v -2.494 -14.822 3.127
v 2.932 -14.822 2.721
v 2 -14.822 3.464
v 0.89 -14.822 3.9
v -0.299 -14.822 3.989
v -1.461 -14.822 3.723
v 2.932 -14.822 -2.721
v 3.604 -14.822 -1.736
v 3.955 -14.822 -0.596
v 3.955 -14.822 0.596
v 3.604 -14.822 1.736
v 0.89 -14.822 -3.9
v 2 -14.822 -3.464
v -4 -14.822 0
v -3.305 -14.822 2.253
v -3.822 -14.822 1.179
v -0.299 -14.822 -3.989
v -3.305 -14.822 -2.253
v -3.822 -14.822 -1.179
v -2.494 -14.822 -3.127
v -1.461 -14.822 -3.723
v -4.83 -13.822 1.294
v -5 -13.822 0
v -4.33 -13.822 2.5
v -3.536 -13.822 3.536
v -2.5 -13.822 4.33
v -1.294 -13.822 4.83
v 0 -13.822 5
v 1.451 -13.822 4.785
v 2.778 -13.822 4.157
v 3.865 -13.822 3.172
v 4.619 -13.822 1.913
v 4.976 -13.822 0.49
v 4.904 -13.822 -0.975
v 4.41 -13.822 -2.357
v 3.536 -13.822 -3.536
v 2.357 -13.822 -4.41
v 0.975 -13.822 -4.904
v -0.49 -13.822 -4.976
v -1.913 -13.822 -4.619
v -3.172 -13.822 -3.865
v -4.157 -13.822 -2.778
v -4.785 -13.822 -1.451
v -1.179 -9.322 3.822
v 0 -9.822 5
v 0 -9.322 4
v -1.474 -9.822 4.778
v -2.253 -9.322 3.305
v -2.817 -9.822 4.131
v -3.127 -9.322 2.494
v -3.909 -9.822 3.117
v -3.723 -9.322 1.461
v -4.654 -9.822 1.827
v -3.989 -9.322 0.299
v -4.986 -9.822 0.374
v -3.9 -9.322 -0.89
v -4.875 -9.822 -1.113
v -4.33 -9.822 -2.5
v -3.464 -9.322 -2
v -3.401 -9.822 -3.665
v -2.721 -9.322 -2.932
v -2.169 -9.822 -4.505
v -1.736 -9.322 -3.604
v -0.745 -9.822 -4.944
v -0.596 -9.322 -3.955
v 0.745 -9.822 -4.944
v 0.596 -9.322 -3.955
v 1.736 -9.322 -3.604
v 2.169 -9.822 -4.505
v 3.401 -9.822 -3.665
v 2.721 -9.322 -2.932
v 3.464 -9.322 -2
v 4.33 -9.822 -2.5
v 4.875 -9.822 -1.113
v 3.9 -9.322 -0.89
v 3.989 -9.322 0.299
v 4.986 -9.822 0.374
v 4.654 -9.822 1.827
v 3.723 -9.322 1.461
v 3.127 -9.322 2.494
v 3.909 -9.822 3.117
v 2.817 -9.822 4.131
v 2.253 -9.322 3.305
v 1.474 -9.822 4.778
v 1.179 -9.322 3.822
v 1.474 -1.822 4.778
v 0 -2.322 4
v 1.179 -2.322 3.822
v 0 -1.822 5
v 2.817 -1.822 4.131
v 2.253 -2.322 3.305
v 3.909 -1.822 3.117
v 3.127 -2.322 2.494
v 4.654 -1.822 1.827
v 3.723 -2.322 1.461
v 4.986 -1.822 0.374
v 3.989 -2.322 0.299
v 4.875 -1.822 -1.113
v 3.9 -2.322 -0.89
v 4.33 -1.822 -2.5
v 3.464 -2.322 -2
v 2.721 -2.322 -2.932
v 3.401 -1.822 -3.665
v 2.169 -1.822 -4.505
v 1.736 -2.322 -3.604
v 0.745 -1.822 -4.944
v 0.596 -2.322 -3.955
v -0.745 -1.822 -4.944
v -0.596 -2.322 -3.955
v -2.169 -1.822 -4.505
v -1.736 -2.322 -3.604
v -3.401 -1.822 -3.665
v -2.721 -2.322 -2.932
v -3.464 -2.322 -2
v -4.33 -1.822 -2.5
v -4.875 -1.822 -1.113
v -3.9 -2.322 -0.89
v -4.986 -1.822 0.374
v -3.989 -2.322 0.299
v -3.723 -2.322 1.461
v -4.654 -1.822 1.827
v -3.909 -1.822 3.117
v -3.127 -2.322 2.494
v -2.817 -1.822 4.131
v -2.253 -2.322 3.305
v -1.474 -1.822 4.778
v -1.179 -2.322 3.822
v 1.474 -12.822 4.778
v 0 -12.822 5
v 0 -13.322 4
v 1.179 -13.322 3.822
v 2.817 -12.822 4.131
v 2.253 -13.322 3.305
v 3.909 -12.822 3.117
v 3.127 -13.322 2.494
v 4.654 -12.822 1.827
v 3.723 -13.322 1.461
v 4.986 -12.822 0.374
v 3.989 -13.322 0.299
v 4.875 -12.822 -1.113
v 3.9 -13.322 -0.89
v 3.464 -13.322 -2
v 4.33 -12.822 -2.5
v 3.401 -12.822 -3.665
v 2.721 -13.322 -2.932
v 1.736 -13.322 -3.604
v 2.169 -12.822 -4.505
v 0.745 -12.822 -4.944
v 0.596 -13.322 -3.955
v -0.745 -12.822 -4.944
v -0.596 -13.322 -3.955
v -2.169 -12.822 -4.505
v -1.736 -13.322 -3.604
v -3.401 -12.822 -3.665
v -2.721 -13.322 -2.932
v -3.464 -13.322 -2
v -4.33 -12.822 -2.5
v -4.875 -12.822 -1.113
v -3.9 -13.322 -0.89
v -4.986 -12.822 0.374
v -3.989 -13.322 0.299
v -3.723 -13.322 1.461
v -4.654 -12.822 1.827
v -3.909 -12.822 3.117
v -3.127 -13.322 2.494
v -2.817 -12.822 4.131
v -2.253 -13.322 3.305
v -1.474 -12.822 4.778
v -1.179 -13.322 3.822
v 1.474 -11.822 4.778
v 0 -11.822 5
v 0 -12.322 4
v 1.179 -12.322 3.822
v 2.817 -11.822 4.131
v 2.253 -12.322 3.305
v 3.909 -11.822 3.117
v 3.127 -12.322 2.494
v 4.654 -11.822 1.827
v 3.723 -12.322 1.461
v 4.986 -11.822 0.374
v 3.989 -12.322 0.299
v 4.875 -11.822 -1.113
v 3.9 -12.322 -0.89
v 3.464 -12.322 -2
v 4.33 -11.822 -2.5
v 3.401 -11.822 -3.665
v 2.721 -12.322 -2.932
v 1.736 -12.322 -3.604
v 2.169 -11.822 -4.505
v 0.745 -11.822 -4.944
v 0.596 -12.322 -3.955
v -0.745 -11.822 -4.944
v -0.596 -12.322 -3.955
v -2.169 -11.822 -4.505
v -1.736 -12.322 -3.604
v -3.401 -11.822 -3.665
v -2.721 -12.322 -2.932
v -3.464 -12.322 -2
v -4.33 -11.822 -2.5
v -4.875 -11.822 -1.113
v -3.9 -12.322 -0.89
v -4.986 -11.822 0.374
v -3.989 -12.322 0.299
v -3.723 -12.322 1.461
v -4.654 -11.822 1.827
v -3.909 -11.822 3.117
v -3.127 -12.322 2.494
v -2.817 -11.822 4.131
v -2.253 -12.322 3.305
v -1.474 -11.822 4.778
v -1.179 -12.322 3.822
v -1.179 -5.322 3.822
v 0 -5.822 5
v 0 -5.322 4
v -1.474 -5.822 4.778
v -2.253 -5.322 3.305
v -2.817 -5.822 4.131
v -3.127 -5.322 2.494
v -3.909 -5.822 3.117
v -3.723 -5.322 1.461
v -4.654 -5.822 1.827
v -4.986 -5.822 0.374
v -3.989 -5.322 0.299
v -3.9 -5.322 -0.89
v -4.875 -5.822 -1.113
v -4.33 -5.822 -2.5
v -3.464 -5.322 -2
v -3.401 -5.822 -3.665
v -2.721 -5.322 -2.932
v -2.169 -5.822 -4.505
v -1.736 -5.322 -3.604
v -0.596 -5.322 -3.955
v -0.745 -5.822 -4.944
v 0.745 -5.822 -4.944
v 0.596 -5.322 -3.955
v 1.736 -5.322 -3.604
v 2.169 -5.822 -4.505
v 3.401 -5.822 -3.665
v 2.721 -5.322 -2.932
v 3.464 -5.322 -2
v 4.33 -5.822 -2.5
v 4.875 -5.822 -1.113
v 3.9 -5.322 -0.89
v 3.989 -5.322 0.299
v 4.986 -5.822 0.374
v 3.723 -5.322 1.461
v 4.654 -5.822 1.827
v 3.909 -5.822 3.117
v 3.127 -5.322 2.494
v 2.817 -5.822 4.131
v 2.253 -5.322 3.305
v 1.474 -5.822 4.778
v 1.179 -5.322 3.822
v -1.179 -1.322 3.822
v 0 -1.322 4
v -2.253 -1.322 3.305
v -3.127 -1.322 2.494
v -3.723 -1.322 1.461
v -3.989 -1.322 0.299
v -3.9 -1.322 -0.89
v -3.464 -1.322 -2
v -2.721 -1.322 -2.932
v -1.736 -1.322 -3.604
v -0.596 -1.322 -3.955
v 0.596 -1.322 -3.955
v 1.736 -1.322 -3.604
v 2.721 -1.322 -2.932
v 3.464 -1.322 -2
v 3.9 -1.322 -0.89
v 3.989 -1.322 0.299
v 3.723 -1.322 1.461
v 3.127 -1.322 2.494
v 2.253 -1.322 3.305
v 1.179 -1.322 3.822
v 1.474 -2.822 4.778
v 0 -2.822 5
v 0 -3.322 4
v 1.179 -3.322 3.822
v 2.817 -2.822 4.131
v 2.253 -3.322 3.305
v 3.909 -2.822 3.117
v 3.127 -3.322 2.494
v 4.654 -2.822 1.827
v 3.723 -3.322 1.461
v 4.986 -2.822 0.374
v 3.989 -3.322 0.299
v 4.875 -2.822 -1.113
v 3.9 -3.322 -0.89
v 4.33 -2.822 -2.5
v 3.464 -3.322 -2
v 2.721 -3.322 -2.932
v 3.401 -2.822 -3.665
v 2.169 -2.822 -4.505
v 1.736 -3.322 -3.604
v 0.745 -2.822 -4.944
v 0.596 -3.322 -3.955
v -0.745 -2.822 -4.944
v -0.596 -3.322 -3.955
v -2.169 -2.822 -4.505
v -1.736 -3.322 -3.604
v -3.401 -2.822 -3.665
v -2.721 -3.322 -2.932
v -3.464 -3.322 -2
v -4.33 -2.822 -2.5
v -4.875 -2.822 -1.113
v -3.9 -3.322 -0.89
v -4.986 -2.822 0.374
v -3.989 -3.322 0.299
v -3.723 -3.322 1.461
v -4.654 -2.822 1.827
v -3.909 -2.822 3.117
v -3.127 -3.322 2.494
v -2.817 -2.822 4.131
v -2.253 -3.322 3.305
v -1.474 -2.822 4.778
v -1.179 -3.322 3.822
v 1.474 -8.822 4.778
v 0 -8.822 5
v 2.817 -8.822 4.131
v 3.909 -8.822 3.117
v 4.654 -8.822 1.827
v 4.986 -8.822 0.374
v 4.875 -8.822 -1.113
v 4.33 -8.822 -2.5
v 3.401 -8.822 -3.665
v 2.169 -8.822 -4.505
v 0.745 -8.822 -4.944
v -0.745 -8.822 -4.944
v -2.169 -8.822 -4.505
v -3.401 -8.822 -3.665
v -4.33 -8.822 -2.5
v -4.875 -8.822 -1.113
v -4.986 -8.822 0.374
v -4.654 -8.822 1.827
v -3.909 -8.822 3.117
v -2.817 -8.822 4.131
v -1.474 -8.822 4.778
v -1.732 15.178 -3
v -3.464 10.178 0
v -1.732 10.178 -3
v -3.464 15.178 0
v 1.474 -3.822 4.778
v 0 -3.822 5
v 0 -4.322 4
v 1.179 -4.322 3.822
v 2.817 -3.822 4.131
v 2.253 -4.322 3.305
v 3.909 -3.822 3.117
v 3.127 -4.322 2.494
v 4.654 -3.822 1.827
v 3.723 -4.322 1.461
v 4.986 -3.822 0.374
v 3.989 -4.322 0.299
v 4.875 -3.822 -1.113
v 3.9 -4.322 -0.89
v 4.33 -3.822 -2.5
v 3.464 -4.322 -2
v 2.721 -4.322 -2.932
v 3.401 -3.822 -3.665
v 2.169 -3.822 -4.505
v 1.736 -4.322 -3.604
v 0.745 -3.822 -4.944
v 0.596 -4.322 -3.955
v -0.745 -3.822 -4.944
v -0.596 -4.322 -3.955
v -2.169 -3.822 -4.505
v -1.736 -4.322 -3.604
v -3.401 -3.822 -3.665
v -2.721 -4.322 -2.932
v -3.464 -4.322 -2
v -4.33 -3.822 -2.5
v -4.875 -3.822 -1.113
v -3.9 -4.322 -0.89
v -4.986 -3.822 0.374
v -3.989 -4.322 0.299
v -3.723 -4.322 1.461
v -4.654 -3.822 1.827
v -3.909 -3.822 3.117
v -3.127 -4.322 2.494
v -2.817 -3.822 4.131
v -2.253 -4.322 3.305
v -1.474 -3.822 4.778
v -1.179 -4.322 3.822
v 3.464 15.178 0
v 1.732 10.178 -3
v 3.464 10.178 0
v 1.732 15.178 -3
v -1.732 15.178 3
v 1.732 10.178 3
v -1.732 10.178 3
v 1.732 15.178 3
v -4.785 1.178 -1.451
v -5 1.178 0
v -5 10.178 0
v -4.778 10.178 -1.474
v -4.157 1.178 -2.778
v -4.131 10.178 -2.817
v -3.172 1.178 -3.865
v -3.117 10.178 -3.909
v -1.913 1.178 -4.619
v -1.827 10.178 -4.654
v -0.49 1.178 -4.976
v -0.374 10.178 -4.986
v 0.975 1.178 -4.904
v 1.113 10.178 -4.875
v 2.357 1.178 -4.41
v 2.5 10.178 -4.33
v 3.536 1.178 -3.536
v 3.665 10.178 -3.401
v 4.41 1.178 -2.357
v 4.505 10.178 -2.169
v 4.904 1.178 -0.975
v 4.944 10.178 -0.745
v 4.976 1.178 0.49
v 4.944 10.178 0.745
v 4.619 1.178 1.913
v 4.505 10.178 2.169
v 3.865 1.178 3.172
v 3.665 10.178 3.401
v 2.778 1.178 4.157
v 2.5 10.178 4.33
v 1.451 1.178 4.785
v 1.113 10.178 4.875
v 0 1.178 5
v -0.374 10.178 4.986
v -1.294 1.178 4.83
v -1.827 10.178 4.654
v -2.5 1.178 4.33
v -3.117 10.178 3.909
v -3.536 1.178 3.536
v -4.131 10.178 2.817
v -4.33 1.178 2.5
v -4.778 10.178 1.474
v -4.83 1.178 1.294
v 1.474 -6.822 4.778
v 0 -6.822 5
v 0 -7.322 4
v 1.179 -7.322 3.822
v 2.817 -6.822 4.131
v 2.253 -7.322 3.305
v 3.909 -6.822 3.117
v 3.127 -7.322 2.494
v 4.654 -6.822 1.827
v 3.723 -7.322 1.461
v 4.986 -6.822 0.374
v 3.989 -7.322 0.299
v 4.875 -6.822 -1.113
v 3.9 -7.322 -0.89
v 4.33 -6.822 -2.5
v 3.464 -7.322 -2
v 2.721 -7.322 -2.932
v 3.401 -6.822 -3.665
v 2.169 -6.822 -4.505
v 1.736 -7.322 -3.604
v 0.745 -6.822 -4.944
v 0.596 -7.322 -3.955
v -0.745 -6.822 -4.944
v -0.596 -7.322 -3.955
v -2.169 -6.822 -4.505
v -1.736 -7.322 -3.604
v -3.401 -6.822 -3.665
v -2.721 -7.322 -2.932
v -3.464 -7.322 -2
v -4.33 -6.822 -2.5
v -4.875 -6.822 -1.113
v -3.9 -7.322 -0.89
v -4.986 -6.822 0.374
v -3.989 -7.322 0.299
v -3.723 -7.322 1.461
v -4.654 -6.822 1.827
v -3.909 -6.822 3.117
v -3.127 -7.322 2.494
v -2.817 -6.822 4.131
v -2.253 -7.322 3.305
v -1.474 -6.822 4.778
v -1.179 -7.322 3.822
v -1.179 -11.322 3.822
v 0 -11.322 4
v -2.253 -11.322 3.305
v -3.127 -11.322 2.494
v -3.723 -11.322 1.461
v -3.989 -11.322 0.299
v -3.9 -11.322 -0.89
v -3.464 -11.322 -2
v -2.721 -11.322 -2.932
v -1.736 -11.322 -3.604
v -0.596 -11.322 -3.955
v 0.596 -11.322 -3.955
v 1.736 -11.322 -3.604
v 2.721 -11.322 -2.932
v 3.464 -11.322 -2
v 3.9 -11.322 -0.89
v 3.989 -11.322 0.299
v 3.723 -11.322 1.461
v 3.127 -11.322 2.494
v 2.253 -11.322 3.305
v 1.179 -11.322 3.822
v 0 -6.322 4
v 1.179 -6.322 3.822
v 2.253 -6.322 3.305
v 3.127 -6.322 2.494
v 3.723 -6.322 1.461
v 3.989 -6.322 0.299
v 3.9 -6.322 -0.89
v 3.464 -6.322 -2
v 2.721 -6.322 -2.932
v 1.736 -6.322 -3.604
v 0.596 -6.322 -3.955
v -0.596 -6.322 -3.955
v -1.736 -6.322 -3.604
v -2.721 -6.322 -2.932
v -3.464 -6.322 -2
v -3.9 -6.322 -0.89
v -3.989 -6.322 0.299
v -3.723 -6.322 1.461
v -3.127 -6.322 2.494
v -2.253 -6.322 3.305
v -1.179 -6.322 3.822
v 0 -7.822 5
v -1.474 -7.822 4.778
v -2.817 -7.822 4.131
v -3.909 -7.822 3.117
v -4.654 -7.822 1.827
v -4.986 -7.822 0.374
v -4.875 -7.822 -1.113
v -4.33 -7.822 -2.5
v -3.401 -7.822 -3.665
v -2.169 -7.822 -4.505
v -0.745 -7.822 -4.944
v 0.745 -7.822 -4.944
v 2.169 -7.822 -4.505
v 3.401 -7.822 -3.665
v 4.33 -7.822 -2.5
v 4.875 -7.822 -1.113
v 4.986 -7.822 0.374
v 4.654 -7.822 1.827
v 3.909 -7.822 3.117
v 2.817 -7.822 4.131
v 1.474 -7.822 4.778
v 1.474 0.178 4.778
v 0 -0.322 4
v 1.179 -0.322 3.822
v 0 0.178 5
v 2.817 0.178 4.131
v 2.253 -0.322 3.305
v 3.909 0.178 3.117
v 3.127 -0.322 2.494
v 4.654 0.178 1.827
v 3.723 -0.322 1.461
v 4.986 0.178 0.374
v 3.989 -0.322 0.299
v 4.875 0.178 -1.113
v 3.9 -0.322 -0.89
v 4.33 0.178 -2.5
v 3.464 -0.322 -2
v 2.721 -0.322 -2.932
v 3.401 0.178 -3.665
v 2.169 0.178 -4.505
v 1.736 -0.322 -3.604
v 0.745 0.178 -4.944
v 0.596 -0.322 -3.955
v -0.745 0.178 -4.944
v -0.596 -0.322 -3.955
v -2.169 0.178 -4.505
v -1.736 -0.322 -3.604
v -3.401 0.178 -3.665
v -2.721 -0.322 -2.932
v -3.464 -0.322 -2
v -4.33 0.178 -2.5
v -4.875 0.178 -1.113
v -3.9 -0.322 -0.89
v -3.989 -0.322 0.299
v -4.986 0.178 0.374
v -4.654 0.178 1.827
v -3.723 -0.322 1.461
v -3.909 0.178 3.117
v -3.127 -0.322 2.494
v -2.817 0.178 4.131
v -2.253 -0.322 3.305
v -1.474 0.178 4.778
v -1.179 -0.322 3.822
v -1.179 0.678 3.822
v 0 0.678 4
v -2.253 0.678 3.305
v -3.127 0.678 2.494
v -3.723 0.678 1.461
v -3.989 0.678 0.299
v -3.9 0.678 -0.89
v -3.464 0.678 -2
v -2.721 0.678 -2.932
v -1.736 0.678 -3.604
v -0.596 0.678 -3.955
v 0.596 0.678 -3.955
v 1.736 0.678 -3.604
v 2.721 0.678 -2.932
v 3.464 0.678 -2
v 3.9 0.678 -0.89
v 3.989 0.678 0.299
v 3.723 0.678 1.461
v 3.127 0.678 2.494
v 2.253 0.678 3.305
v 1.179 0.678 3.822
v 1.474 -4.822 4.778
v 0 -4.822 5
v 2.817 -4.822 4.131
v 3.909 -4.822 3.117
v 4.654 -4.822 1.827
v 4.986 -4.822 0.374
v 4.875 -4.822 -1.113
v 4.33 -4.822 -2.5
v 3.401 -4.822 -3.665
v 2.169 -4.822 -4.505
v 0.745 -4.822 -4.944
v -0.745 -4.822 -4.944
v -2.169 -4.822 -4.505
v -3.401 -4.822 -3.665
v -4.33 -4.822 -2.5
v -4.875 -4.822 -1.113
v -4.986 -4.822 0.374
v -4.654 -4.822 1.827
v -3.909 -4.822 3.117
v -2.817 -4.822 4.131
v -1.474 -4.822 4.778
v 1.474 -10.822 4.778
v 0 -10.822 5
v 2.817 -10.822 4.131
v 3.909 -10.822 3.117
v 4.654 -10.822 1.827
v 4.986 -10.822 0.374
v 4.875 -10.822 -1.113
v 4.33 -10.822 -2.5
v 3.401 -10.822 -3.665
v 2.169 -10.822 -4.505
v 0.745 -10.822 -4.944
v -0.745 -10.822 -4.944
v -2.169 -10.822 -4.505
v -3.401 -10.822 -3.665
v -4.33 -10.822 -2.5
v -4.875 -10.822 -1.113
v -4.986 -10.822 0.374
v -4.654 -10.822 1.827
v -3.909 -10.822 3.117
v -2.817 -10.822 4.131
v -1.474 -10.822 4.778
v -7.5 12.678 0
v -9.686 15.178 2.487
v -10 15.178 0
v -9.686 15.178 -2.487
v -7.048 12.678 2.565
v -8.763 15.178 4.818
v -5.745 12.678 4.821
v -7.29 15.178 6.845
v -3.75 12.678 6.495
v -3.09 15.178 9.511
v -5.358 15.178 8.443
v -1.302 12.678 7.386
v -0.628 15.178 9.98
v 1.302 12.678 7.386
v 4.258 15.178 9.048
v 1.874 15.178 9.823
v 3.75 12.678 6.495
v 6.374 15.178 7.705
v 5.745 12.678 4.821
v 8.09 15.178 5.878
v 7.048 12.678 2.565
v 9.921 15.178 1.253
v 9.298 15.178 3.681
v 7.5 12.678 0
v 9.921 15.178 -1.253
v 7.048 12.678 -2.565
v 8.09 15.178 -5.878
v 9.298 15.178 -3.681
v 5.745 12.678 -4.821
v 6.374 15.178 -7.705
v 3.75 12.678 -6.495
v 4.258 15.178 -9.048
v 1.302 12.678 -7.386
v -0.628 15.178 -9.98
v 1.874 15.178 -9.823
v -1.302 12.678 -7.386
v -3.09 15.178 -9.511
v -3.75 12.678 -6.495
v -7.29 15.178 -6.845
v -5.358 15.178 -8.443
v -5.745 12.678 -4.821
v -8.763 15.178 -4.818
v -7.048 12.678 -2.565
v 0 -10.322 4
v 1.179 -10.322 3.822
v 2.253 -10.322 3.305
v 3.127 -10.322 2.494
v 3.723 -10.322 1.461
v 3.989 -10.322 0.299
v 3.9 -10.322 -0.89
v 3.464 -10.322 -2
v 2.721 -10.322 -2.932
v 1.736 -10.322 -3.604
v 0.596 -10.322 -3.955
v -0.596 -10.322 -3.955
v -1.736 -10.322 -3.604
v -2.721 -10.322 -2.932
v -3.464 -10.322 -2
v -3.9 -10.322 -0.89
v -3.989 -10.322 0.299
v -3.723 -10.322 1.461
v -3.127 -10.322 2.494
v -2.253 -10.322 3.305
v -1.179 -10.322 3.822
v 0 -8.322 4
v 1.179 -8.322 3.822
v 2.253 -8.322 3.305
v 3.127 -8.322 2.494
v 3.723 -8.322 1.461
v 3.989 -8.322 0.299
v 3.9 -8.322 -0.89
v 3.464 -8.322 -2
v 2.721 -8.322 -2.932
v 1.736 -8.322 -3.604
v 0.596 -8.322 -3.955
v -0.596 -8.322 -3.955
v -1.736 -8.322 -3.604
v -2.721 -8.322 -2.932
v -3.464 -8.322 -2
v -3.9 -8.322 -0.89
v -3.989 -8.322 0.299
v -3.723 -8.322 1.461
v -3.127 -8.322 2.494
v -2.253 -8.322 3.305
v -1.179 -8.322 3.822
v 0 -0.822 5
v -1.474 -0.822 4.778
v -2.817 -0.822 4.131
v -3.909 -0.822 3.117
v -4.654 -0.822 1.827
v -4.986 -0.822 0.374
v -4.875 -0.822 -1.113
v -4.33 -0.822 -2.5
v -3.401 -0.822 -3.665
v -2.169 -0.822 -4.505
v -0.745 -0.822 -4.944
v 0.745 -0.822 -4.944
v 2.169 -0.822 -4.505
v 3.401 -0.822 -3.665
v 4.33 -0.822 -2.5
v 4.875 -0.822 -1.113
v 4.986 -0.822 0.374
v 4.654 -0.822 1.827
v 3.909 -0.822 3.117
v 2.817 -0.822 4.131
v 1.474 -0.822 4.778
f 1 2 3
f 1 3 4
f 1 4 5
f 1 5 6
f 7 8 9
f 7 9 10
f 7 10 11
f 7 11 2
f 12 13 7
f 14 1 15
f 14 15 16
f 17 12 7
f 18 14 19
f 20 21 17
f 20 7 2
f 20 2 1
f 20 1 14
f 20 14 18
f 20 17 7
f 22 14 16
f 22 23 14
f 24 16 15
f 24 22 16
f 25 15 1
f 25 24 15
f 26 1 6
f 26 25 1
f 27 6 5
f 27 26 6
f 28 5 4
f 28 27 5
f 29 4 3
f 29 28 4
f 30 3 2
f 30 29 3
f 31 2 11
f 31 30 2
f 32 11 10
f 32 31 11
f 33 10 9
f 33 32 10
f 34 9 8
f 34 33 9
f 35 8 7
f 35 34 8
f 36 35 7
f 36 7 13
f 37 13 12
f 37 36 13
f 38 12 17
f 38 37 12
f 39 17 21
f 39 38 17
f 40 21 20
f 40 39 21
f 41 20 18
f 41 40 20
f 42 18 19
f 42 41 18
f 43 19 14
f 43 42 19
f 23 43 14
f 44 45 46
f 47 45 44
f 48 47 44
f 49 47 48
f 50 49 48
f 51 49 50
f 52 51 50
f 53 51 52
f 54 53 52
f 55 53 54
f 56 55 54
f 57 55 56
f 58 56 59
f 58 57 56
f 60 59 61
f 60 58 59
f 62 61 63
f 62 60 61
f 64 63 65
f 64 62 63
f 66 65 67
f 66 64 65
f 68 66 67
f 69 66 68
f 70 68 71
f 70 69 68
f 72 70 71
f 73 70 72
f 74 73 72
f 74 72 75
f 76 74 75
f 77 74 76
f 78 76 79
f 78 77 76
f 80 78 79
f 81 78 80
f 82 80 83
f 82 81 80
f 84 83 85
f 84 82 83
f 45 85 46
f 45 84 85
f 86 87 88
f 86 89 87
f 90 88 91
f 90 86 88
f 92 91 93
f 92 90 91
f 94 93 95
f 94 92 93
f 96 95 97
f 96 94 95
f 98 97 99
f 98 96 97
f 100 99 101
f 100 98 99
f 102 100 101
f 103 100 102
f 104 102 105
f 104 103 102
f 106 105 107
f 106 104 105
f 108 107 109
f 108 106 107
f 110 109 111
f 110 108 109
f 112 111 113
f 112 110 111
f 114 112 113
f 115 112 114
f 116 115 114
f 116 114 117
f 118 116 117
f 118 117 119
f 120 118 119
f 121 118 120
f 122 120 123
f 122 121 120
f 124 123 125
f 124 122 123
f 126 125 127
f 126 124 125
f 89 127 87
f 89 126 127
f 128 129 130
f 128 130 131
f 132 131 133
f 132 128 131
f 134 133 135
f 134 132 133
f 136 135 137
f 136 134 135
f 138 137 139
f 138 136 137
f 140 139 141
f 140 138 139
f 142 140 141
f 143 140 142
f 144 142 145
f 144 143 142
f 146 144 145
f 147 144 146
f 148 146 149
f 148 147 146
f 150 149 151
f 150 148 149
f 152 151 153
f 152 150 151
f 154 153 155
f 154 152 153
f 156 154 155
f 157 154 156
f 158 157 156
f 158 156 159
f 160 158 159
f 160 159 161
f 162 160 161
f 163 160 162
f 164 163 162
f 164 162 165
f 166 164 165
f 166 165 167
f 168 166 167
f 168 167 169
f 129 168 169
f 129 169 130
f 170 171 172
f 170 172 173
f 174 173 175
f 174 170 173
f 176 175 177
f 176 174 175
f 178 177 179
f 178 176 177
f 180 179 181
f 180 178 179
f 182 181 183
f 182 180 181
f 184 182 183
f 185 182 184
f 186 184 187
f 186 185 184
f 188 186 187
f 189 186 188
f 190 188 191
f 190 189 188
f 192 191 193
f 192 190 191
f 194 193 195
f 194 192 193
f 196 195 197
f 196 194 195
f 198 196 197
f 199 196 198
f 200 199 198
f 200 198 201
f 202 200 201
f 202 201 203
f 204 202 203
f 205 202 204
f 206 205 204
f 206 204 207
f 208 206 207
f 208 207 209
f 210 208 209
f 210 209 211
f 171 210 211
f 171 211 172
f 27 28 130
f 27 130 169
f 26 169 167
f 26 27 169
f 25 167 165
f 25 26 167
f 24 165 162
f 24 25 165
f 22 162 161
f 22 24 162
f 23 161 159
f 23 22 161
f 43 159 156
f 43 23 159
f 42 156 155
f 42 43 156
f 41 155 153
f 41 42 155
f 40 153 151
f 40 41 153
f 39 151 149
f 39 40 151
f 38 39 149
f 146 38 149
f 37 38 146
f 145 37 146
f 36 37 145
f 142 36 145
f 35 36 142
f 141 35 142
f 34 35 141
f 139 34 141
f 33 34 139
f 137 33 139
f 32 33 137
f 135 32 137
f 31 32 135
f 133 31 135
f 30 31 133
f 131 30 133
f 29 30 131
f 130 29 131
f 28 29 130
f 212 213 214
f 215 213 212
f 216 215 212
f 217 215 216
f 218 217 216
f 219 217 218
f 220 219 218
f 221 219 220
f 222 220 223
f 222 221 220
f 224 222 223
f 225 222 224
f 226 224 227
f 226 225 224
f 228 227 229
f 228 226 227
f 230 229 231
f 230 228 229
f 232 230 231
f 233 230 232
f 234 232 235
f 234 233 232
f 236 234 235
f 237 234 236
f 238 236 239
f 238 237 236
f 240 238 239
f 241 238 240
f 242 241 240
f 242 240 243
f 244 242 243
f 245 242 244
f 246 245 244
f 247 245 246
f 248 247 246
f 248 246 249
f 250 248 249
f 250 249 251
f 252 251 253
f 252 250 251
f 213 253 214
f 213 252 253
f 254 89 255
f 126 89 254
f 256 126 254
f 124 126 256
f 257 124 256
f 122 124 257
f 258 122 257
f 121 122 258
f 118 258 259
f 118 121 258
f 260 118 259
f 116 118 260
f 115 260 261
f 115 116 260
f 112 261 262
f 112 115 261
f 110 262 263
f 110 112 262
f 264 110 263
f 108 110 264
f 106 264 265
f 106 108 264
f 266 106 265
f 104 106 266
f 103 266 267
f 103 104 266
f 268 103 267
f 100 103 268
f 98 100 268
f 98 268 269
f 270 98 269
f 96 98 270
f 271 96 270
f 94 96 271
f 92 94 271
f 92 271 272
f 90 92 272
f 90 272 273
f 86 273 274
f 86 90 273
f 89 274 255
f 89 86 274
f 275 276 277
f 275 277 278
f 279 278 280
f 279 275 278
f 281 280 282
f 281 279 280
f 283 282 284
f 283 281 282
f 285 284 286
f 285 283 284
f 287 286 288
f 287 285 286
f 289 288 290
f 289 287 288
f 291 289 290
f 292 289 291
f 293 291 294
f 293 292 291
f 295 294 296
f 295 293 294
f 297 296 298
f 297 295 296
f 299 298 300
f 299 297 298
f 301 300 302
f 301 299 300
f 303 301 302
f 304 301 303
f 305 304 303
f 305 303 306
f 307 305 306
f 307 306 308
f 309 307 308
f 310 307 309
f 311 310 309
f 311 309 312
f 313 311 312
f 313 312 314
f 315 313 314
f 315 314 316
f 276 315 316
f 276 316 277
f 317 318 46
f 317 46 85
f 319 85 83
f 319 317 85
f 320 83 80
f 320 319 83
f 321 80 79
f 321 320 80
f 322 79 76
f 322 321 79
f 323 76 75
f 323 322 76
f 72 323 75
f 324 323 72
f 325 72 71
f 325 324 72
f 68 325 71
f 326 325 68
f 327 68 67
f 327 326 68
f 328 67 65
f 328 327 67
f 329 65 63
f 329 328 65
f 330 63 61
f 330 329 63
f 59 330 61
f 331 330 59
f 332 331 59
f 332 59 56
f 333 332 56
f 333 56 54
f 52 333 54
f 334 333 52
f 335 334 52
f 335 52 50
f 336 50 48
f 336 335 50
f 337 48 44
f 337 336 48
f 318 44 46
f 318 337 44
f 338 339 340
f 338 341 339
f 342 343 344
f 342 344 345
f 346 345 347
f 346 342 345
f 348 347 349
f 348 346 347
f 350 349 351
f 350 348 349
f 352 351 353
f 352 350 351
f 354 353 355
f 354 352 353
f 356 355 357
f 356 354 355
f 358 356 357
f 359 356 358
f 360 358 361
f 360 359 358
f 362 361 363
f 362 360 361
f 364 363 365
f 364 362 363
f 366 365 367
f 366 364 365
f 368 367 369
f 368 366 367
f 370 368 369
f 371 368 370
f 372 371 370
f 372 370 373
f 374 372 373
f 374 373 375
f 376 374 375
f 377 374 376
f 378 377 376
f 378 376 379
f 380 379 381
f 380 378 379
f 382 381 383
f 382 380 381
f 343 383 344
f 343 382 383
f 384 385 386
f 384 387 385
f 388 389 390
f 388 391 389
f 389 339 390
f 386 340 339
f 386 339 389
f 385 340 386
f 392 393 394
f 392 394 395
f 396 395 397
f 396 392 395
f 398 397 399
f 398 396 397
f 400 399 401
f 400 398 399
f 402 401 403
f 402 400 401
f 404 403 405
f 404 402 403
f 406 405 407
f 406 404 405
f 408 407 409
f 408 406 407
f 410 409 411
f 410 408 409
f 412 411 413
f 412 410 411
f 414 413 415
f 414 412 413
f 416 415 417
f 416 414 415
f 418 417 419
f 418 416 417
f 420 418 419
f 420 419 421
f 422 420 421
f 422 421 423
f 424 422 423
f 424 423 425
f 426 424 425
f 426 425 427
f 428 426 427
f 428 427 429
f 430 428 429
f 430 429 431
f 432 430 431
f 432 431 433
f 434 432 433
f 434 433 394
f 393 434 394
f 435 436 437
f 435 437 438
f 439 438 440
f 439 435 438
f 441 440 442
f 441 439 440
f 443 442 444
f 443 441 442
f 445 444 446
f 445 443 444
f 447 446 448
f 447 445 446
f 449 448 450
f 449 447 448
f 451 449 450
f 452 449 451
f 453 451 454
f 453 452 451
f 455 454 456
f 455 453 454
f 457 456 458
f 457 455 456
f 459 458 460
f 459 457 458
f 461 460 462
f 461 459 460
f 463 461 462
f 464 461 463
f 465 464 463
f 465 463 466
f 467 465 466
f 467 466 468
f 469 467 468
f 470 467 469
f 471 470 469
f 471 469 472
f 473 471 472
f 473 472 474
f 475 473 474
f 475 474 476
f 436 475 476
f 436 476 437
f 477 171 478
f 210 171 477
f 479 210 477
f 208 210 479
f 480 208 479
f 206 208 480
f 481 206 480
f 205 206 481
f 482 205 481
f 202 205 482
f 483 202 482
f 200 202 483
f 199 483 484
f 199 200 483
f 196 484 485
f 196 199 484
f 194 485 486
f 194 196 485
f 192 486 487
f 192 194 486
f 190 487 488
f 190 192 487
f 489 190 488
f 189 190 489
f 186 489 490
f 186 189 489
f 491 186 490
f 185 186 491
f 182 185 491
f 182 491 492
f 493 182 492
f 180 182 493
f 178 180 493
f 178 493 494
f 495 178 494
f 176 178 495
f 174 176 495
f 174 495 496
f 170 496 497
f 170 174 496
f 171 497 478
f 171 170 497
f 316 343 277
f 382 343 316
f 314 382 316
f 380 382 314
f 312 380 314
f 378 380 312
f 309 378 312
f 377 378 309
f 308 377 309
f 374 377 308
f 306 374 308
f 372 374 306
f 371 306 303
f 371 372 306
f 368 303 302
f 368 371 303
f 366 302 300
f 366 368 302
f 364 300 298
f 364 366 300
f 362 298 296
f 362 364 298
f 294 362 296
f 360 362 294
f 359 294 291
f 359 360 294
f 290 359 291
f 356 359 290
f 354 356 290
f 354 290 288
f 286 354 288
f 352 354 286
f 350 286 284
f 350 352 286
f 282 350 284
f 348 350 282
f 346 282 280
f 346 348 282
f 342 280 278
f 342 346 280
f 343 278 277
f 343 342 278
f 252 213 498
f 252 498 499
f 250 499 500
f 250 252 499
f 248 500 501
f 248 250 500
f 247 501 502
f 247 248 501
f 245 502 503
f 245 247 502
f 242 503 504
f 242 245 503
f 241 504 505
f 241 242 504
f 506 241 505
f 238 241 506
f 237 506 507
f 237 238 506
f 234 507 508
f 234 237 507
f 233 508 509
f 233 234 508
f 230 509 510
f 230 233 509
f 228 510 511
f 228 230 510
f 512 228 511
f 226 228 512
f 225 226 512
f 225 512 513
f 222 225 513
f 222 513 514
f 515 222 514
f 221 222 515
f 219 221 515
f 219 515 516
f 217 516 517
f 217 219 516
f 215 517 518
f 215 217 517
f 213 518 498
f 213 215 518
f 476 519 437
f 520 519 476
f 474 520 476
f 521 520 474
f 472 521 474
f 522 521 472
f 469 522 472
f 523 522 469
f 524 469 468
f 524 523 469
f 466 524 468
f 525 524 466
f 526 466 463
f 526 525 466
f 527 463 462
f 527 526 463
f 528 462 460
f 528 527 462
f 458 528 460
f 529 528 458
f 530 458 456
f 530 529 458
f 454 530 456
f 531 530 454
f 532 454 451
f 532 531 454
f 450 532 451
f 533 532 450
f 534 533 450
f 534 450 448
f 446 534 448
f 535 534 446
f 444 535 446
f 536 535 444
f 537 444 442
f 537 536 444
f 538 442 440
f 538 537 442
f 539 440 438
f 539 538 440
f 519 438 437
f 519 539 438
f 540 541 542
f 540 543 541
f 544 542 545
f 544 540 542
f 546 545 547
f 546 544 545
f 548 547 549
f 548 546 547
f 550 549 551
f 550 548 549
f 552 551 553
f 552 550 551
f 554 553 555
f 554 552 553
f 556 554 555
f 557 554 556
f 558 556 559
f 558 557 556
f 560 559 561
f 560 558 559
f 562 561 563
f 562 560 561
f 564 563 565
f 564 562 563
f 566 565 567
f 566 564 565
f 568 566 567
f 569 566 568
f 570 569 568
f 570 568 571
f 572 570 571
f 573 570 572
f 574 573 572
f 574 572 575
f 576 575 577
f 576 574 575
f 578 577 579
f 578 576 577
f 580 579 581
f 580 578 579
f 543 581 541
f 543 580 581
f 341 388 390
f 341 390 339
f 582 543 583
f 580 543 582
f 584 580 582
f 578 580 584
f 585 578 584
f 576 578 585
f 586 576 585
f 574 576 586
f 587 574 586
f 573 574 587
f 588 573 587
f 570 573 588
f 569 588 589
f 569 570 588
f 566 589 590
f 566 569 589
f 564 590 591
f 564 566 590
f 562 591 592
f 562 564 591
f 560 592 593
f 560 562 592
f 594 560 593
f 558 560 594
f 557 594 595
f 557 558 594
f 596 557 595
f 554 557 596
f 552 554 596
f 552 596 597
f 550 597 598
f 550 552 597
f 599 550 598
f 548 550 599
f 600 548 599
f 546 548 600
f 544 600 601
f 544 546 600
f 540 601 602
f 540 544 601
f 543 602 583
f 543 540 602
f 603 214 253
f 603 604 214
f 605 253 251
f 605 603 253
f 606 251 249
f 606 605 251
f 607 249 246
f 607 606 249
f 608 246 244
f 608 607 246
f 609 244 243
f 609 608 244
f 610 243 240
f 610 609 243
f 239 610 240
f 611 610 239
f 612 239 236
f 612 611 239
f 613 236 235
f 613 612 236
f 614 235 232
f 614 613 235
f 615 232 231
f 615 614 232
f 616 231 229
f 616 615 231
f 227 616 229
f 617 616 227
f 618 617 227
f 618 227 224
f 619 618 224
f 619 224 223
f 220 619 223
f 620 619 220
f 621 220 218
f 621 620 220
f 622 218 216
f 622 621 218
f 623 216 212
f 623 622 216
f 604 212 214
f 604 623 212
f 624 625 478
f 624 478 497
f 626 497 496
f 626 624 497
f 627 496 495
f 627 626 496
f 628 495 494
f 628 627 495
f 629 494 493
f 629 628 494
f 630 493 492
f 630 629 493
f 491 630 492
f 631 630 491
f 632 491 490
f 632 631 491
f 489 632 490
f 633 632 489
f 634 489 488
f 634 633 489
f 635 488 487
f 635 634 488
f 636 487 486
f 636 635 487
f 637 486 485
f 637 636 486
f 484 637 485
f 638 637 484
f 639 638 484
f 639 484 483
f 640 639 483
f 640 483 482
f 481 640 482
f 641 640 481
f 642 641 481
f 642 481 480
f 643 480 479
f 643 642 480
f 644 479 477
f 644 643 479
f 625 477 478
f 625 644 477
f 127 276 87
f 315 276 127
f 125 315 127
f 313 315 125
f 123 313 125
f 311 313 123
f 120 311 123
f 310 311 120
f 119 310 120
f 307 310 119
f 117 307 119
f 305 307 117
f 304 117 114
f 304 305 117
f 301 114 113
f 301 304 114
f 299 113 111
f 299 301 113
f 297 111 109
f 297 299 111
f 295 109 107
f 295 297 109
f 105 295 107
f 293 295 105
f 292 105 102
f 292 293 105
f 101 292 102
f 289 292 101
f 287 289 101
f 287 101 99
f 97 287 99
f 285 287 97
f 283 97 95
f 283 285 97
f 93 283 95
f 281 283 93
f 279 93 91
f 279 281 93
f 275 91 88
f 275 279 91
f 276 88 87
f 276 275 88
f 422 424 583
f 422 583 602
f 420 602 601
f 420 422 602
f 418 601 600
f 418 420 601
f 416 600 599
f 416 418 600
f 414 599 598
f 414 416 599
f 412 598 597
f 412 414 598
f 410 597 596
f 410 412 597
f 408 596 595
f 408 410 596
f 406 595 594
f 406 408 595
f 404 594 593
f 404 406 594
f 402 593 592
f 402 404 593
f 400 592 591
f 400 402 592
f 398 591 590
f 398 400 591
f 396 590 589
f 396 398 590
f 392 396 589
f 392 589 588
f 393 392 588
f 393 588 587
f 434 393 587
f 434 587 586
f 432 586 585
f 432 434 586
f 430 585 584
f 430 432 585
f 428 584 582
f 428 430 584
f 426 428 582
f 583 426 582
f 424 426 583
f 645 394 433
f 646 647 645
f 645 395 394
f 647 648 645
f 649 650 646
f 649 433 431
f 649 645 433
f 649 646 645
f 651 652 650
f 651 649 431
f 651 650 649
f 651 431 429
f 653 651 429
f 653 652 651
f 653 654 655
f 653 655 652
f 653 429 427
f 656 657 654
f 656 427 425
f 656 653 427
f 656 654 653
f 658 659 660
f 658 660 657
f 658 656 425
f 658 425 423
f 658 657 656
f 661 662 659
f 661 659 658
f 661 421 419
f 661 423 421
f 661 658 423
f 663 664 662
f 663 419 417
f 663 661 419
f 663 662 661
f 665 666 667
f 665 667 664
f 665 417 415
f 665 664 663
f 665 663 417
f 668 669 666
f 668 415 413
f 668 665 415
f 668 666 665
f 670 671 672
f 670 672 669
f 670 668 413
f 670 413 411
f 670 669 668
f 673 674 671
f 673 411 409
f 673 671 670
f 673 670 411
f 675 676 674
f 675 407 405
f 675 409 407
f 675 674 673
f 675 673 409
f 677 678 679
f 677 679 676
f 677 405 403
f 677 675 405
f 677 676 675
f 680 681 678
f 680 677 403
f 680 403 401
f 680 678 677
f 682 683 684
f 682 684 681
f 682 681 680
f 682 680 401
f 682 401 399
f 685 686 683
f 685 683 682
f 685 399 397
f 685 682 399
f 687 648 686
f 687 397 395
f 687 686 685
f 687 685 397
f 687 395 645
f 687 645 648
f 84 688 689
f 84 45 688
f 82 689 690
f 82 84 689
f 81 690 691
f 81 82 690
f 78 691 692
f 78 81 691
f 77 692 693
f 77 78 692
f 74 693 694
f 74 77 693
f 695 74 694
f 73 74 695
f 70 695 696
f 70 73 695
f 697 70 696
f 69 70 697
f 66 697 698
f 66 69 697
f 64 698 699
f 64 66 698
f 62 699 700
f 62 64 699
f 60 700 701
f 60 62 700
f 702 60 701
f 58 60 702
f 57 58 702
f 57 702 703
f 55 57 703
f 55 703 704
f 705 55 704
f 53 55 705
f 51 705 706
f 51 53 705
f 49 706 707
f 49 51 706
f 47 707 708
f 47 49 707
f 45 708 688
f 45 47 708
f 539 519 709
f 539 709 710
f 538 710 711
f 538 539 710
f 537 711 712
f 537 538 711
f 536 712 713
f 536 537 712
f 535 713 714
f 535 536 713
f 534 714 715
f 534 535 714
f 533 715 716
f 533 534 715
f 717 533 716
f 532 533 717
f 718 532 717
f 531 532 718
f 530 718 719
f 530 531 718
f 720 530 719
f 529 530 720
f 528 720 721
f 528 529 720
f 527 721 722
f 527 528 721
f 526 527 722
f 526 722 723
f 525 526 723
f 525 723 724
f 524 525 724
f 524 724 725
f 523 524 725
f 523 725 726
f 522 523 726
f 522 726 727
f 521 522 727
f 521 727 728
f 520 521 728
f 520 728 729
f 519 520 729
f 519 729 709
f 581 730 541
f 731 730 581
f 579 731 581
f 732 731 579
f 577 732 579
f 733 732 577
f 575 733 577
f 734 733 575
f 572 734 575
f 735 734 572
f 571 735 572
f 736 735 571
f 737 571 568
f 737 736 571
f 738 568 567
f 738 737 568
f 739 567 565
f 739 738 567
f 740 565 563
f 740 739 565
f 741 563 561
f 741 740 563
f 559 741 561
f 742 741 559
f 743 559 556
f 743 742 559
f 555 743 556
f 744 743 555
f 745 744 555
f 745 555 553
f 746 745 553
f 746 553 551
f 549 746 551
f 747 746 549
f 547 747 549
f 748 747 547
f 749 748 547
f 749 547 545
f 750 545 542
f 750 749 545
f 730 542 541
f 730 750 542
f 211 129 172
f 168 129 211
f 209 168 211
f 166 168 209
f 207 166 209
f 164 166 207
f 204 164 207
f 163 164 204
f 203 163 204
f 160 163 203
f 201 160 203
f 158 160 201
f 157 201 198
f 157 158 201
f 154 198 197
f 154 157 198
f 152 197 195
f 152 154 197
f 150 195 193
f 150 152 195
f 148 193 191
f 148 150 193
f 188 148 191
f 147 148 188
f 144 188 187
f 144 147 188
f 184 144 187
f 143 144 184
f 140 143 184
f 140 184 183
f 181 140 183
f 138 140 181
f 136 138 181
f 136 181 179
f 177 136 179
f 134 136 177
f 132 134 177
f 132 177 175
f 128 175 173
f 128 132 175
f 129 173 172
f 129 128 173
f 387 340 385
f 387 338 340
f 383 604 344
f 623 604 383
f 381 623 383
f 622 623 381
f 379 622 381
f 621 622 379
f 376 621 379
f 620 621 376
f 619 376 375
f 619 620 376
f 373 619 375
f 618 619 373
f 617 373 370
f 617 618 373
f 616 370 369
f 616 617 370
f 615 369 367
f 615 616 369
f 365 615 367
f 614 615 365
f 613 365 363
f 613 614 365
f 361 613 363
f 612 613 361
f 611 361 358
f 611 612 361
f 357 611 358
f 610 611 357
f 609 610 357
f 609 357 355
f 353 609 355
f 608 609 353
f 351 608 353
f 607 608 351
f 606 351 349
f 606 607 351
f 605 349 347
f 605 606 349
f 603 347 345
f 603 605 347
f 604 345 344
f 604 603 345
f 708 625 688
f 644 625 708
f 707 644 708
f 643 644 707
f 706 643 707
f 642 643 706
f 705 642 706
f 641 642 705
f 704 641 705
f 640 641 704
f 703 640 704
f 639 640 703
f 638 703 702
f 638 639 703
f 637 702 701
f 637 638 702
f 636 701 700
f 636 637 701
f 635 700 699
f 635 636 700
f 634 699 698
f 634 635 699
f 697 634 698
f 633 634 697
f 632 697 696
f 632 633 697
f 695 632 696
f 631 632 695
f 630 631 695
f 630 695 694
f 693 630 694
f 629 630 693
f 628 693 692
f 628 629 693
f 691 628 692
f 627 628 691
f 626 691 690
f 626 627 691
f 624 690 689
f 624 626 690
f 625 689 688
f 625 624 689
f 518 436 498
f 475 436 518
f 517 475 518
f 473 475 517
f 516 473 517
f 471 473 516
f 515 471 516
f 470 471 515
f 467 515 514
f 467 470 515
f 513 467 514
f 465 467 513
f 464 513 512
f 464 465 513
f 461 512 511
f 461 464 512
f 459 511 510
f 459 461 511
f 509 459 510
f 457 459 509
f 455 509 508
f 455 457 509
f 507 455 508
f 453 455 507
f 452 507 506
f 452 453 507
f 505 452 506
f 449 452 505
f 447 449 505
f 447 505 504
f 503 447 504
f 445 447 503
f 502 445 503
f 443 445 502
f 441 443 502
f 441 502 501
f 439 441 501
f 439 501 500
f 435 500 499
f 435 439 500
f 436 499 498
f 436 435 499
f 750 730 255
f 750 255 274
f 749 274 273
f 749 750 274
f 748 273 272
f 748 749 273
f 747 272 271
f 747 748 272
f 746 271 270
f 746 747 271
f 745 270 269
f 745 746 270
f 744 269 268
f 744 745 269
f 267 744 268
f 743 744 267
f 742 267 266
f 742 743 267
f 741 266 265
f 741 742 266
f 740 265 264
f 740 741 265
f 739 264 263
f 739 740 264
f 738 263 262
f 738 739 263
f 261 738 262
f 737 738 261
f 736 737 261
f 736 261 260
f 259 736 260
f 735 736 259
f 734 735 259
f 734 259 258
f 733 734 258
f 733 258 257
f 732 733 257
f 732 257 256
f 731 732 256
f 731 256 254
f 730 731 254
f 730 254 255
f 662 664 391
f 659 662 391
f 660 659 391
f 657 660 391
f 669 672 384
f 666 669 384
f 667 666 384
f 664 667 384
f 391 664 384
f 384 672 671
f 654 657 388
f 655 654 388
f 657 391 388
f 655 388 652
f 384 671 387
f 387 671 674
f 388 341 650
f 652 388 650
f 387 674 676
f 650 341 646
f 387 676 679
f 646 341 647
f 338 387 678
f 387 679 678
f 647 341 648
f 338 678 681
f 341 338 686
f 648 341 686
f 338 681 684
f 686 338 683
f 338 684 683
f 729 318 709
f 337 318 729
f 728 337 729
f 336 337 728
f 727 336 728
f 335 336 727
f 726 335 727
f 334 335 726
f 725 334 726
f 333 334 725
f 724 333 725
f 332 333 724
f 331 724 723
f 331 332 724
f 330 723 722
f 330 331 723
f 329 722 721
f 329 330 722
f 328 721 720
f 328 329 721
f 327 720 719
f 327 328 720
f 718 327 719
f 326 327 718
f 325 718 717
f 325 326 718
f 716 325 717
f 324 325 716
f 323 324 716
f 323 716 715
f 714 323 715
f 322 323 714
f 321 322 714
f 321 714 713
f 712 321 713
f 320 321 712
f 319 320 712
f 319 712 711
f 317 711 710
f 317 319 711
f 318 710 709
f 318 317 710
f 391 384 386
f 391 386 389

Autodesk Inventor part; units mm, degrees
ref_plane "YZ Plane" through (0, 0, 0) normal (1, 0, 0) x (0, 1, 0)
ref_plane "XZ Plane" through (0, 0, 0) normal (0, 1, 0) x (-1, 0, 0)
ref_plane "XY Plane" through (0, 0, 0) normal (0, 0, 1) x (1, 0, 0)
sketch "Sketch1" plane through (0, 0, 0) normal (0, 0, 1) x (1, 0, 0)
  line L0 (0, 19.6828) -> (0, -18.3172)
  line L1 (-0.377, 15.178) -> (-10, 15.178)
  line L2 (-10, 15.178) -> (-5, 10.178)
  line L3 (-5, 10.178) -> (-5, -14.822)
  line L4 (-5, -14.822) -> (0, -14.822)
  line L5 (0, -14.822) -> (0, 15.178)
  line L6 (-0.377, 15.178) -> (0, 15.178)
  dimension "d2" = 20
  dimension "d3" = 45
  dimension "d4" = 30
  dimension "d6" = 10
revolve "Revolution1" add sketch "Sketch1" angle 360 about axis through (0, 19.6828, 0) along (0, -1, 0)
chamfer "Chamfer1" distance 1 angle 45 1 edges at (5, -14.822, 0)
sketch "Sketch2" plane through (0, 0, 0) normal (1, 0, 0) x (0, 1, 0)
  line L0 (-13.822, 5) -> (10.178, 5) projected
  line L1 (-13.822, -5) -> (10.178, -5) projected
  line L2 (-13.822, 5) -> (-13.322, 4)
  line L3 (-13.322, 4) -> (-12.822, 5)
  line L4 (-13.822, 5) -> (-12.822, 5)
  line L5 (-12.622, 0) -> (13.978, 0) projected
  dimension "d10" = 1
  dimension "d12" = 1
revolve "Revolution2" cut sketch "Sketch2" angle 360 about axis through (0, -10, 0) along (0, 1, 0)
pattern_linear "Rectangular Pattern1" count 15 spacing 1 along (0, 1, 0) of "Revolution2"
sketch "Sketch3" plane through (0, 15.178, 0) normal (0, 1, 0) x (1, 0, 0)
  circle A0 centre (0, 0) radius 10 projected
  line L0 (1.7321, -3) -> (-1.7321, -3)
  line L1 (-1.7321, -3) -> (-3.4641, 0)
  line L2 (-3.4641, 0) -> (-1.7321, 3)
  line L3 (-1.7321, 3) -> (1.7321, 3)
  line L4 (1.7321, 3) -> (3.4641, 0)
  line L5 (3.4641, 0) -> (1.7321, -3)
  dimension "d17" = 6
extrude "Extrusion1" cut sketch "Sketch3" against normal blind 5 contours L0 L1 L2 L3 L4 L5
properties part number "M10x30 Allen Frezato"
